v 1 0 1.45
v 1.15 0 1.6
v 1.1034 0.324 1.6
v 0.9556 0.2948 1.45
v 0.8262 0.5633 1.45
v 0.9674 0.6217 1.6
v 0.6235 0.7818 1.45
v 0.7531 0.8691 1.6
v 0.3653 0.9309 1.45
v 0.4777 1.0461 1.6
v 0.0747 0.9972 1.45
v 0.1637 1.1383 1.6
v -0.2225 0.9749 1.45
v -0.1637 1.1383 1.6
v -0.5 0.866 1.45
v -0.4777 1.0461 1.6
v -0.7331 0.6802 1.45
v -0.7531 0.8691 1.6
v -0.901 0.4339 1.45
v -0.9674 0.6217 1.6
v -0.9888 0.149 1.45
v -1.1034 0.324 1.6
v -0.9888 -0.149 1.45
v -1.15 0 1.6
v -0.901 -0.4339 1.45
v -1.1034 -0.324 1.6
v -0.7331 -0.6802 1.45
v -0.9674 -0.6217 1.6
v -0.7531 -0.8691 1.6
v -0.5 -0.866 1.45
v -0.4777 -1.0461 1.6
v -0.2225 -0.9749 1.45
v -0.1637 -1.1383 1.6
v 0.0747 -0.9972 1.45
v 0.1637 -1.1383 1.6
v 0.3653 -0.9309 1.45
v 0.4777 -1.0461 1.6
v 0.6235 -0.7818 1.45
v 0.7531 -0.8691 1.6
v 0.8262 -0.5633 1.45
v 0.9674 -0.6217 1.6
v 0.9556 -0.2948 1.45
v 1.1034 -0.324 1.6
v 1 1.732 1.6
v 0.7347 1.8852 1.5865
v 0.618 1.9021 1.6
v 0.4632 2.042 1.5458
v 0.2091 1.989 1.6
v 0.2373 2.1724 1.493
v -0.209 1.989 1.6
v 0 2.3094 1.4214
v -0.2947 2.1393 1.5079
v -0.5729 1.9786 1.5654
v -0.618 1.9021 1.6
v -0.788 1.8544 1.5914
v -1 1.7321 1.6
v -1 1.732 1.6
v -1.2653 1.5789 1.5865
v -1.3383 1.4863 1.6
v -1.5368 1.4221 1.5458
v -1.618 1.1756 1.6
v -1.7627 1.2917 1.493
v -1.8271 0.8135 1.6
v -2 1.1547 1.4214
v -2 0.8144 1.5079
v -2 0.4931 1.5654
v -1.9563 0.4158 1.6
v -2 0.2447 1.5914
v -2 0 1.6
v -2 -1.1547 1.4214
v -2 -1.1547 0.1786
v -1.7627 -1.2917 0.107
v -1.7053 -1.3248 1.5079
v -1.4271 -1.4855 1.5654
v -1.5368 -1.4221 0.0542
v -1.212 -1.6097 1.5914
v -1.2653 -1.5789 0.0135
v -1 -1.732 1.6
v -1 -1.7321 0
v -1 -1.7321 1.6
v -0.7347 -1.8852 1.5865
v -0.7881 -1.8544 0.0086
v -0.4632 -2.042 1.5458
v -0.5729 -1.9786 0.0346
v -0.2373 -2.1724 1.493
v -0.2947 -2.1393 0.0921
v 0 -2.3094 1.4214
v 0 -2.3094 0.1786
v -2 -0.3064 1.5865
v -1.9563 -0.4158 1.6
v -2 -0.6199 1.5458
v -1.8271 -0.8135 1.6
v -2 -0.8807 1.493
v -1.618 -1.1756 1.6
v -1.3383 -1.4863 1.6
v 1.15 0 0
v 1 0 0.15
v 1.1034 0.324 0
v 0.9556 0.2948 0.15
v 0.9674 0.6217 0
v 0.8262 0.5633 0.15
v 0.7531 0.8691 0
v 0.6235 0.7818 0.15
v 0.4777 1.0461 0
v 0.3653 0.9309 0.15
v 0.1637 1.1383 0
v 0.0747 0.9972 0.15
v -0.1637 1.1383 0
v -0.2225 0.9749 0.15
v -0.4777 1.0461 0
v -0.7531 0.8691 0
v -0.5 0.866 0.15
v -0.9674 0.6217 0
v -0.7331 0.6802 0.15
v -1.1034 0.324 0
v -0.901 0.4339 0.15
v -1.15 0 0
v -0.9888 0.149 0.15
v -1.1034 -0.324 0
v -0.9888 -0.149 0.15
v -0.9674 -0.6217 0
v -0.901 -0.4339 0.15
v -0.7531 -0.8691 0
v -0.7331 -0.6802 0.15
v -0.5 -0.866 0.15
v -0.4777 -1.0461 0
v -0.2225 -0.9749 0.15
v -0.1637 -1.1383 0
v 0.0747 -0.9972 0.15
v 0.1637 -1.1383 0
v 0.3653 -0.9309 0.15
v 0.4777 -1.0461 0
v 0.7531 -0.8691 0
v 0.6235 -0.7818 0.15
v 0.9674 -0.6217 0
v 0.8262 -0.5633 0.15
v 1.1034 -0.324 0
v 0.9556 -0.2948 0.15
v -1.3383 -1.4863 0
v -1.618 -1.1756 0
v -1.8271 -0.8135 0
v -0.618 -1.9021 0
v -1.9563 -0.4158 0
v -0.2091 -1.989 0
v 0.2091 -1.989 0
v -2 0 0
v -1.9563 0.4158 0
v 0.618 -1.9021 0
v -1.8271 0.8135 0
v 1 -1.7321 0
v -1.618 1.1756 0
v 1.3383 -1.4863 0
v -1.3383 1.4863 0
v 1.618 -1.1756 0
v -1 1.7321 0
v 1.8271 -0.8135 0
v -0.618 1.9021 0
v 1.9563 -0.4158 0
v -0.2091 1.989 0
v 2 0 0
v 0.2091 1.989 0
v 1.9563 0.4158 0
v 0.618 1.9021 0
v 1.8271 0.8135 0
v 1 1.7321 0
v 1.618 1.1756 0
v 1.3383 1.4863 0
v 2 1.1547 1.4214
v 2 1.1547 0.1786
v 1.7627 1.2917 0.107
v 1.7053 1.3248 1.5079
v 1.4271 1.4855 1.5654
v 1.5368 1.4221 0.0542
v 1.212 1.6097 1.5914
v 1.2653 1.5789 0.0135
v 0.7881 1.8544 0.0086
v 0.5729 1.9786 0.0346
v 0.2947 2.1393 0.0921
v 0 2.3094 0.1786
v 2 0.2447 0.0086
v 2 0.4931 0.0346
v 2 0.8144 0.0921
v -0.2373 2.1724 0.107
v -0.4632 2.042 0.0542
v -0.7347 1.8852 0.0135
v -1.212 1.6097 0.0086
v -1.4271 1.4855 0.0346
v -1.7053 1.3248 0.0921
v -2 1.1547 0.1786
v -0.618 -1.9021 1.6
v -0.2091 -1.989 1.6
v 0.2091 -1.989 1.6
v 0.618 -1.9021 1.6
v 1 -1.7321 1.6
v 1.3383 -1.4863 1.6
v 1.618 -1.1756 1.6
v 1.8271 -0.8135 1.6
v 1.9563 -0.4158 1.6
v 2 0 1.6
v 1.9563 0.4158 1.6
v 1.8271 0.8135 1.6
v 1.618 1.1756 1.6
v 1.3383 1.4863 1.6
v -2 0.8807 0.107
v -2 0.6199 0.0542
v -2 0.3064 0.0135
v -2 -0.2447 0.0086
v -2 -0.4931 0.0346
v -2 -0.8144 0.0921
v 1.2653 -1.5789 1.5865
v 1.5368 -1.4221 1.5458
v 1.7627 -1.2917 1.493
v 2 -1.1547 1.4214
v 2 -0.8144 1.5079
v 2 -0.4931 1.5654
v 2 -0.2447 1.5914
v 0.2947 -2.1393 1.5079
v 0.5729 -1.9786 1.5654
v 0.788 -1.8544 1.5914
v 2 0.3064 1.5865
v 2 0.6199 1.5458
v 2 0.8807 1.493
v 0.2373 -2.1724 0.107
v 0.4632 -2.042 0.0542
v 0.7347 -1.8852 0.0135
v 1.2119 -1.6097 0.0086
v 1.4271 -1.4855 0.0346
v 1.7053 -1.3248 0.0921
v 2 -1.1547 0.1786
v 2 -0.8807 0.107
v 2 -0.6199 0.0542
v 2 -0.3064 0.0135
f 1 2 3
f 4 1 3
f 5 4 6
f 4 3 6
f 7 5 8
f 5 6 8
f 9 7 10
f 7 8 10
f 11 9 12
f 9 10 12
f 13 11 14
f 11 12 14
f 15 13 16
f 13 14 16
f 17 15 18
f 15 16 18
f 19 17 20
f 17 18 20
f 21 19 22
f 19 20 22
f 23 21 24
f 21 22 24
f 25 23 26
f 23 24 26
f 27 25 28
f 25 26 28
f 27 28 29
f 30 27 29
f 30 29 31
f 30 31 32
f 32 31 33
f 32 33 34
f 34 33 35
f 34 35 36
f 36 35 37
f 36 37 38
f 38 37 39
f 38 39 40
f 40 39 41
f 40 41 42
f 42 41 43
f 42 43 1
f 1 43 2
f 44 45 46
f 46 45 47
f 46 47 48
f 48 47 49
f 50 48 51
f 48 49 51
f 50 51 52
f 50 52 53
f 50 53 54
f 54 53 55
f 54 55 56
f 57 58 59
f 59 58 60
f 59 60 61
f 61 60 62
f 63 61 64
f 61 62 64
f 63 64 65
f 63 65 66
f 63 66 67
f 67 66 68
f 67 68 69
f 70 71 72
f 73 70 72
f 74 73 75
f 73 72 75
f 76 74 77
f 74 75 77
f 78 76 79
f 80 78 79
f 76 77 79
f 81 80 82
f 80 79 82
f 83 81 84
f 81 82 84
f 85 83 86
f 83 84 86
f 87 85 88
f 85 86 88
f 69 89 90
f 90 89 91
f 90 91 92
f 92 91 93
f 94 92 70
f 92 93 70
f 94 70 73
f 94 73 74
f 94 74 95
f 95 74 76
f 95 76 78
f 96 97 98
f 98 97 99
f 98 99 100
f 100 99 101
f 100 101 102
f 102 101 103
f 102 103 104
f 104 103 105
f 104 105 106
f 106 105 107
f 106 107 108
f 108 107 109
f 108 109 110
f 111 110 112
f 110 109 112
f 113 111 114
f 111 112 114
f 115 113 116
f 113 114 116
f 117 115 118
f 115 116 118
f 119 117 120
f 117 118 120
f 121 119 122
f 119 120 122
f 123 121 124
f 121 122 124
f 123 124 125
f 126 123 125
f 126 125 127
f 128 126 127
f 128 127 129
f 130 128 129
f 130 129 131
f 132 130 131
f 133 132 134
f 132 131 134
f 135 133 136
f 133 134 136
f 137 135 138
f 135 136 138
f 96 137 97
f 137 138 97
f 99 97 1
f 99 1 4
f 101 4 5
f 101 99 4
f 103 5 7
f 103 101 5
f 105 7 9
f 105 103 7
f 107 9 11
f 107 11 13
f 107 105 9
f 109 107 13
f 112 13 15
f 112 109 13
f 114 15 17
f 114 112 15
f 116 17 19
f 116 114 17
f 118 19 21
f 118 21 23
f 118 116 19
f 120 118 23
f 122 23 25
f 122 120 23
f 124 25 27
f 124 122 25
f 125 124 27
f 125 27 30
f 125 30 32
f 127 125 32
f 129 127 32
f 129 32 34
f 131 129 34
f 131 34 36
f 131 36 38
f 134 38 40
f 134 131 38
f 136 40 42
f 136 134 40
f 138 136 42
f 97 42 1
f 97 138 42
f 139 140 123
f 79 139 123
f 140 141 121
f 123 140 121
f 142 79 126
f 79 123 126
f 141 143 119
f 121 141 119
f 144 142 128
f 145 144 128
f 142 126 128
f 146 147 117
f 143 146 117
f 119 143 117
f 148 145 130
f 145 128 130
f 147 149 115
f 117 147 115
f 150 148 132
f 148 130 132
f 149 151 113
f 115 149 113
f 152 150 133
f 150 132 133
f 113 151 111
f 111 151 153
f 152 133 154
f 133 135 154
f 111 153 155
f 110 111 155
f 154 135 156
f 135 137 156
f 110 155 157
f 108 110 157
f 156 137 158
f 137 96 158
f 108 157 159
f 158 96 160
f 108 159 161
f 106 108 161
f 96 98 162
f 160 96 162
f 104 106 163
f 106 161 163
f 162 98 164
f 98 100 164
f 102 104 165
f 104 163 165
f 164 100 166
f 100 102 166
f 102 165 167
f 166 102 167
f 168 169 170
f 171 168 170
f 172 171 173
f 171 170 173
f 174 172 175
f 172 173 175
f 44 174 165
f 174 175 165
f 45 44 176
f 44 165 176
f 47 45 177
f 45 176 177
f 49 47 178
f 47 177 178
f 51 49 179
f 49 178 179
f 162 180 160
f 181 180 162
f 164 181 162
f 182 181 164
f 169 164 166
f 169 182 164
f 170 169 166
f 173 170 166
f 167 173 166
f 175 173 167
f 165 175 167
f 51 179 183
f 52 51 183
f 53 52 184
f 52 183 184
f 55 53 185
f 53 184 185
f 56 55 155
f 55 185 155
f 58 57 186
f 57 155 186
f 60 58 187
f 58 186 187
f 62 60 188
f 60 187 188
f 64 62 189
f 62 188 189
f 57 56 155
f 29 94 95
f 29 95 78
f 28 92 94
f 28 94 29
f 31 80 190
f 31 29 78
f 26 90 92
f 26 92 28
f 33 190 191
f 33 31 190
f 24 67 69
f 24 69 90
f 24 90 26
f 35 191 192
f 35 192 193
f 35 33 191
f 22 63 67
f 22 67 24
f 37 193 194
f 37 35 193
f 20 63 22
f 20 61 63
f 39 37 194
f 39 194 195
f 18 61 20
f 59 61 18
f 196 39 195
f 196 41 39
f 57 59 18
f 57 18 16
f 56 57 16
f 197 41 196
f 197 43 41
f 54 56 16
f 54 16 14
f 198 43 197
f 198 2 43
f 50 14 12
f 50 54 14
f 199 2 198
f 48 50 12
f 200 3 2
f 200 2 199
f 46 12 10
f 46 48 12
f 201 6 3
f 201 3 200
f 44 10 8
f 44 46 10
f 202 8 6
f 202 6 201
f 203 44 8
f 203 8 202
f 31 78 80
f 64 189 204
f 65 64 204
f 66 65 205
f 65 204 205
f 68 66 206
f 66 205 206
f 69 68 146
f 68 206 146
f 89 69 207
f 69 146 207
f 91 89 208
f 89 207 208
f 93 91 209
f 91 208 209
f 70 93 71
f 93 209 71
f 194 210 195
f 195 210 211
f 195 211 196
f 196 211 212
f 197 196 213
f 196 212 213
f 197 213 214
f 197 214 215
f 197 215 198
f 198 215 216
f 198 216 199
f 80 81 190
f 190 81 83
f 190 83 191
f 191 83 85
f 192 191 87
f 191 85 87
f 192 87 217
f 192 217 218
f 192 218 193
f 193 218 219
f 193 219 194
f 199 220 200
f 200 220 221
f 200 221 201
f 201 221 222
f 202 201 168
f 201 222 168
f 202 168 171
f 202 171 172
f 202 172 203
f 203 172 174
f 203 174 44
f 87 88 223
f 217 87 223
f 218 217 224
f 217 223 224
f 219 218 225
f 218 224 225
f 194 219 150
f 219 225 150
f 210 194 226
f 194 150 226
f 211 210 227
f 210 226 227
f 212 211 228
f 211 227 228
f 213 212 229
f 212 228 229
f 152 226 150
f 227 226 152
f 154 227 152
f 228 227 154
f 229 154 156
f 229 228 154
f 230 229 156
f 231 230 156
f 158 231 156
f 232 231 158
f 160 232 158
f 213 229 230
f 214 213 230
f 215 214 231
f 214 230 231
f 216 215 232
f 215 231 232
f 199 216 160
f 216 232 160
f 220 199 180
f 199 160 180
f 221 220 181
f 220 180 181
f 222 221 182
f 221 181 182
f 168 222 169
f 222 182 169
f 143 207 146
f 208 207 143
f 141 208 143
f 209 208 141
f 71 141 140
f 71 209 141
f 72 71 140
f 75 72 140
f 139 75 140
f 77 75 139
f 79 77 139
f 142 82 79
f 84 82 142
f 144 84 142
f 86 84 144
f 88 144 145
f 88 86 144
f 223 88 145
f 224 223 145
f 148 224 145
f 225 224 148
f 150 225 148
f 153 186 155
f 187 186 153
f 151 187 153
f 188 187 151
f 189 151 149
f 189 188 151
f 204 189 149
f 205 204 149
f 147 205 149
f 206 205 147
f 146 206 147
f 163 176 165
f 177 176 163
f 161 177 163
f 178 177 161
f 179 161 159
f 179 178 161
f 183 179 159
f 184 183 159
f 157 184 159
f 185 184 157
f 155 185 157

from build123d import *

# Parameters (mm, degrees)
SKETCH1_R           = 3
SKETCH1_R_2         = 1
BOSS_EXTRUDE1_DEPTH = 1.6
CHAMFER1_SIZE       = 1
CHAMFER1_SIZE2      = 0.577350269
CHAMFER2_SIZE       = 1
CHAMFER2_SIZE2      = 0.577350269
SKETCH1_3_R         = 3
CUT_EXTRUDE1_DEPTH  = 2.6
CHAMFER3_SIZE       = 0.15


with BuildPart() as part:
    # Sketch1 → Boss-Extrude1 (new body)
    with BuildSketch(Plane.XY):
        Circle(SKETCH1_R)
        Polygon((2, 1.154700538), (0, 2.309401077), (-2, 1.154700538), (-2, -1.154700538), (0, -2.309401077), (2, -1.154700538), align=None, mode=Mode.SUBTRACT)
        Polygon((2, -1.154700538), (2, 1.154700538), (0, 2.309401077), (-2, 1.154700538), (-2, -1.154700538), (0, -2.309401077), align=None)
        Circle(SKETCH1_R_2, mode=Mode.SUBTRACT)
    extrude(amount=BOSS_EXTRUDE1_DEPTH)

    # Chamfer1
    chamfer1_edges = [part.edges().sort_by_distance(p)[0] for p in [
        (-3, 0, 1.6),
    ]]
    chamfer1_side = [part.faces().sort_by_distance(p)[0] for p in [
        (-2.915147186, 0, 1.6),
    ]]
    chamfer(chamfer1_edges, length=CHAMFER1_SIZE, length2=CHAMFER1_SIZE2, reference=chamfer1_side[0])

    # Chamfer2
    chamfer2_edges = [part.edges().sort_by_distance(p)[0] for p in [
        (-3, 0, 0),
    ]]
    chamfer2_side = [part.faces().sort_by_distance(p)[0] for p in [
        (-2.915147186, 0, 0),
    ]]
    chamfer(chamfer2_edges, length=CHAMFER2_SIZE, length2=CHAMFER2_SIZE2, reference=chamfer2_side[0])

    # Sketch1<3> → Cut-Extrude1 (cut, through all)
    with BuildSketch(Plane.XY):
        Circle(SKETCH1_3_R)
        Polygon((2, 1.154700538), (0, 2.309401077), (-2, 1.154700538), (-2, -1.154700538), (0, -2.309401077), (2, -1.154700538), align=None, mode=Mode.SUBTRACT)
    extrude(amount=CUT_EXTRUDE1_DEPTH, mode=Mode.SUBTRACT)

    # Chamfer3
    chamfer3_edges = [part.edges().sort_by_distance(p)[0] for p in [
        (-1, 0, 0),
        (-1, 0, 1.6),
    ]]
    chamfer(chamfer3_edges, length=CHAMFER3_SIZE)


solid = part.part
